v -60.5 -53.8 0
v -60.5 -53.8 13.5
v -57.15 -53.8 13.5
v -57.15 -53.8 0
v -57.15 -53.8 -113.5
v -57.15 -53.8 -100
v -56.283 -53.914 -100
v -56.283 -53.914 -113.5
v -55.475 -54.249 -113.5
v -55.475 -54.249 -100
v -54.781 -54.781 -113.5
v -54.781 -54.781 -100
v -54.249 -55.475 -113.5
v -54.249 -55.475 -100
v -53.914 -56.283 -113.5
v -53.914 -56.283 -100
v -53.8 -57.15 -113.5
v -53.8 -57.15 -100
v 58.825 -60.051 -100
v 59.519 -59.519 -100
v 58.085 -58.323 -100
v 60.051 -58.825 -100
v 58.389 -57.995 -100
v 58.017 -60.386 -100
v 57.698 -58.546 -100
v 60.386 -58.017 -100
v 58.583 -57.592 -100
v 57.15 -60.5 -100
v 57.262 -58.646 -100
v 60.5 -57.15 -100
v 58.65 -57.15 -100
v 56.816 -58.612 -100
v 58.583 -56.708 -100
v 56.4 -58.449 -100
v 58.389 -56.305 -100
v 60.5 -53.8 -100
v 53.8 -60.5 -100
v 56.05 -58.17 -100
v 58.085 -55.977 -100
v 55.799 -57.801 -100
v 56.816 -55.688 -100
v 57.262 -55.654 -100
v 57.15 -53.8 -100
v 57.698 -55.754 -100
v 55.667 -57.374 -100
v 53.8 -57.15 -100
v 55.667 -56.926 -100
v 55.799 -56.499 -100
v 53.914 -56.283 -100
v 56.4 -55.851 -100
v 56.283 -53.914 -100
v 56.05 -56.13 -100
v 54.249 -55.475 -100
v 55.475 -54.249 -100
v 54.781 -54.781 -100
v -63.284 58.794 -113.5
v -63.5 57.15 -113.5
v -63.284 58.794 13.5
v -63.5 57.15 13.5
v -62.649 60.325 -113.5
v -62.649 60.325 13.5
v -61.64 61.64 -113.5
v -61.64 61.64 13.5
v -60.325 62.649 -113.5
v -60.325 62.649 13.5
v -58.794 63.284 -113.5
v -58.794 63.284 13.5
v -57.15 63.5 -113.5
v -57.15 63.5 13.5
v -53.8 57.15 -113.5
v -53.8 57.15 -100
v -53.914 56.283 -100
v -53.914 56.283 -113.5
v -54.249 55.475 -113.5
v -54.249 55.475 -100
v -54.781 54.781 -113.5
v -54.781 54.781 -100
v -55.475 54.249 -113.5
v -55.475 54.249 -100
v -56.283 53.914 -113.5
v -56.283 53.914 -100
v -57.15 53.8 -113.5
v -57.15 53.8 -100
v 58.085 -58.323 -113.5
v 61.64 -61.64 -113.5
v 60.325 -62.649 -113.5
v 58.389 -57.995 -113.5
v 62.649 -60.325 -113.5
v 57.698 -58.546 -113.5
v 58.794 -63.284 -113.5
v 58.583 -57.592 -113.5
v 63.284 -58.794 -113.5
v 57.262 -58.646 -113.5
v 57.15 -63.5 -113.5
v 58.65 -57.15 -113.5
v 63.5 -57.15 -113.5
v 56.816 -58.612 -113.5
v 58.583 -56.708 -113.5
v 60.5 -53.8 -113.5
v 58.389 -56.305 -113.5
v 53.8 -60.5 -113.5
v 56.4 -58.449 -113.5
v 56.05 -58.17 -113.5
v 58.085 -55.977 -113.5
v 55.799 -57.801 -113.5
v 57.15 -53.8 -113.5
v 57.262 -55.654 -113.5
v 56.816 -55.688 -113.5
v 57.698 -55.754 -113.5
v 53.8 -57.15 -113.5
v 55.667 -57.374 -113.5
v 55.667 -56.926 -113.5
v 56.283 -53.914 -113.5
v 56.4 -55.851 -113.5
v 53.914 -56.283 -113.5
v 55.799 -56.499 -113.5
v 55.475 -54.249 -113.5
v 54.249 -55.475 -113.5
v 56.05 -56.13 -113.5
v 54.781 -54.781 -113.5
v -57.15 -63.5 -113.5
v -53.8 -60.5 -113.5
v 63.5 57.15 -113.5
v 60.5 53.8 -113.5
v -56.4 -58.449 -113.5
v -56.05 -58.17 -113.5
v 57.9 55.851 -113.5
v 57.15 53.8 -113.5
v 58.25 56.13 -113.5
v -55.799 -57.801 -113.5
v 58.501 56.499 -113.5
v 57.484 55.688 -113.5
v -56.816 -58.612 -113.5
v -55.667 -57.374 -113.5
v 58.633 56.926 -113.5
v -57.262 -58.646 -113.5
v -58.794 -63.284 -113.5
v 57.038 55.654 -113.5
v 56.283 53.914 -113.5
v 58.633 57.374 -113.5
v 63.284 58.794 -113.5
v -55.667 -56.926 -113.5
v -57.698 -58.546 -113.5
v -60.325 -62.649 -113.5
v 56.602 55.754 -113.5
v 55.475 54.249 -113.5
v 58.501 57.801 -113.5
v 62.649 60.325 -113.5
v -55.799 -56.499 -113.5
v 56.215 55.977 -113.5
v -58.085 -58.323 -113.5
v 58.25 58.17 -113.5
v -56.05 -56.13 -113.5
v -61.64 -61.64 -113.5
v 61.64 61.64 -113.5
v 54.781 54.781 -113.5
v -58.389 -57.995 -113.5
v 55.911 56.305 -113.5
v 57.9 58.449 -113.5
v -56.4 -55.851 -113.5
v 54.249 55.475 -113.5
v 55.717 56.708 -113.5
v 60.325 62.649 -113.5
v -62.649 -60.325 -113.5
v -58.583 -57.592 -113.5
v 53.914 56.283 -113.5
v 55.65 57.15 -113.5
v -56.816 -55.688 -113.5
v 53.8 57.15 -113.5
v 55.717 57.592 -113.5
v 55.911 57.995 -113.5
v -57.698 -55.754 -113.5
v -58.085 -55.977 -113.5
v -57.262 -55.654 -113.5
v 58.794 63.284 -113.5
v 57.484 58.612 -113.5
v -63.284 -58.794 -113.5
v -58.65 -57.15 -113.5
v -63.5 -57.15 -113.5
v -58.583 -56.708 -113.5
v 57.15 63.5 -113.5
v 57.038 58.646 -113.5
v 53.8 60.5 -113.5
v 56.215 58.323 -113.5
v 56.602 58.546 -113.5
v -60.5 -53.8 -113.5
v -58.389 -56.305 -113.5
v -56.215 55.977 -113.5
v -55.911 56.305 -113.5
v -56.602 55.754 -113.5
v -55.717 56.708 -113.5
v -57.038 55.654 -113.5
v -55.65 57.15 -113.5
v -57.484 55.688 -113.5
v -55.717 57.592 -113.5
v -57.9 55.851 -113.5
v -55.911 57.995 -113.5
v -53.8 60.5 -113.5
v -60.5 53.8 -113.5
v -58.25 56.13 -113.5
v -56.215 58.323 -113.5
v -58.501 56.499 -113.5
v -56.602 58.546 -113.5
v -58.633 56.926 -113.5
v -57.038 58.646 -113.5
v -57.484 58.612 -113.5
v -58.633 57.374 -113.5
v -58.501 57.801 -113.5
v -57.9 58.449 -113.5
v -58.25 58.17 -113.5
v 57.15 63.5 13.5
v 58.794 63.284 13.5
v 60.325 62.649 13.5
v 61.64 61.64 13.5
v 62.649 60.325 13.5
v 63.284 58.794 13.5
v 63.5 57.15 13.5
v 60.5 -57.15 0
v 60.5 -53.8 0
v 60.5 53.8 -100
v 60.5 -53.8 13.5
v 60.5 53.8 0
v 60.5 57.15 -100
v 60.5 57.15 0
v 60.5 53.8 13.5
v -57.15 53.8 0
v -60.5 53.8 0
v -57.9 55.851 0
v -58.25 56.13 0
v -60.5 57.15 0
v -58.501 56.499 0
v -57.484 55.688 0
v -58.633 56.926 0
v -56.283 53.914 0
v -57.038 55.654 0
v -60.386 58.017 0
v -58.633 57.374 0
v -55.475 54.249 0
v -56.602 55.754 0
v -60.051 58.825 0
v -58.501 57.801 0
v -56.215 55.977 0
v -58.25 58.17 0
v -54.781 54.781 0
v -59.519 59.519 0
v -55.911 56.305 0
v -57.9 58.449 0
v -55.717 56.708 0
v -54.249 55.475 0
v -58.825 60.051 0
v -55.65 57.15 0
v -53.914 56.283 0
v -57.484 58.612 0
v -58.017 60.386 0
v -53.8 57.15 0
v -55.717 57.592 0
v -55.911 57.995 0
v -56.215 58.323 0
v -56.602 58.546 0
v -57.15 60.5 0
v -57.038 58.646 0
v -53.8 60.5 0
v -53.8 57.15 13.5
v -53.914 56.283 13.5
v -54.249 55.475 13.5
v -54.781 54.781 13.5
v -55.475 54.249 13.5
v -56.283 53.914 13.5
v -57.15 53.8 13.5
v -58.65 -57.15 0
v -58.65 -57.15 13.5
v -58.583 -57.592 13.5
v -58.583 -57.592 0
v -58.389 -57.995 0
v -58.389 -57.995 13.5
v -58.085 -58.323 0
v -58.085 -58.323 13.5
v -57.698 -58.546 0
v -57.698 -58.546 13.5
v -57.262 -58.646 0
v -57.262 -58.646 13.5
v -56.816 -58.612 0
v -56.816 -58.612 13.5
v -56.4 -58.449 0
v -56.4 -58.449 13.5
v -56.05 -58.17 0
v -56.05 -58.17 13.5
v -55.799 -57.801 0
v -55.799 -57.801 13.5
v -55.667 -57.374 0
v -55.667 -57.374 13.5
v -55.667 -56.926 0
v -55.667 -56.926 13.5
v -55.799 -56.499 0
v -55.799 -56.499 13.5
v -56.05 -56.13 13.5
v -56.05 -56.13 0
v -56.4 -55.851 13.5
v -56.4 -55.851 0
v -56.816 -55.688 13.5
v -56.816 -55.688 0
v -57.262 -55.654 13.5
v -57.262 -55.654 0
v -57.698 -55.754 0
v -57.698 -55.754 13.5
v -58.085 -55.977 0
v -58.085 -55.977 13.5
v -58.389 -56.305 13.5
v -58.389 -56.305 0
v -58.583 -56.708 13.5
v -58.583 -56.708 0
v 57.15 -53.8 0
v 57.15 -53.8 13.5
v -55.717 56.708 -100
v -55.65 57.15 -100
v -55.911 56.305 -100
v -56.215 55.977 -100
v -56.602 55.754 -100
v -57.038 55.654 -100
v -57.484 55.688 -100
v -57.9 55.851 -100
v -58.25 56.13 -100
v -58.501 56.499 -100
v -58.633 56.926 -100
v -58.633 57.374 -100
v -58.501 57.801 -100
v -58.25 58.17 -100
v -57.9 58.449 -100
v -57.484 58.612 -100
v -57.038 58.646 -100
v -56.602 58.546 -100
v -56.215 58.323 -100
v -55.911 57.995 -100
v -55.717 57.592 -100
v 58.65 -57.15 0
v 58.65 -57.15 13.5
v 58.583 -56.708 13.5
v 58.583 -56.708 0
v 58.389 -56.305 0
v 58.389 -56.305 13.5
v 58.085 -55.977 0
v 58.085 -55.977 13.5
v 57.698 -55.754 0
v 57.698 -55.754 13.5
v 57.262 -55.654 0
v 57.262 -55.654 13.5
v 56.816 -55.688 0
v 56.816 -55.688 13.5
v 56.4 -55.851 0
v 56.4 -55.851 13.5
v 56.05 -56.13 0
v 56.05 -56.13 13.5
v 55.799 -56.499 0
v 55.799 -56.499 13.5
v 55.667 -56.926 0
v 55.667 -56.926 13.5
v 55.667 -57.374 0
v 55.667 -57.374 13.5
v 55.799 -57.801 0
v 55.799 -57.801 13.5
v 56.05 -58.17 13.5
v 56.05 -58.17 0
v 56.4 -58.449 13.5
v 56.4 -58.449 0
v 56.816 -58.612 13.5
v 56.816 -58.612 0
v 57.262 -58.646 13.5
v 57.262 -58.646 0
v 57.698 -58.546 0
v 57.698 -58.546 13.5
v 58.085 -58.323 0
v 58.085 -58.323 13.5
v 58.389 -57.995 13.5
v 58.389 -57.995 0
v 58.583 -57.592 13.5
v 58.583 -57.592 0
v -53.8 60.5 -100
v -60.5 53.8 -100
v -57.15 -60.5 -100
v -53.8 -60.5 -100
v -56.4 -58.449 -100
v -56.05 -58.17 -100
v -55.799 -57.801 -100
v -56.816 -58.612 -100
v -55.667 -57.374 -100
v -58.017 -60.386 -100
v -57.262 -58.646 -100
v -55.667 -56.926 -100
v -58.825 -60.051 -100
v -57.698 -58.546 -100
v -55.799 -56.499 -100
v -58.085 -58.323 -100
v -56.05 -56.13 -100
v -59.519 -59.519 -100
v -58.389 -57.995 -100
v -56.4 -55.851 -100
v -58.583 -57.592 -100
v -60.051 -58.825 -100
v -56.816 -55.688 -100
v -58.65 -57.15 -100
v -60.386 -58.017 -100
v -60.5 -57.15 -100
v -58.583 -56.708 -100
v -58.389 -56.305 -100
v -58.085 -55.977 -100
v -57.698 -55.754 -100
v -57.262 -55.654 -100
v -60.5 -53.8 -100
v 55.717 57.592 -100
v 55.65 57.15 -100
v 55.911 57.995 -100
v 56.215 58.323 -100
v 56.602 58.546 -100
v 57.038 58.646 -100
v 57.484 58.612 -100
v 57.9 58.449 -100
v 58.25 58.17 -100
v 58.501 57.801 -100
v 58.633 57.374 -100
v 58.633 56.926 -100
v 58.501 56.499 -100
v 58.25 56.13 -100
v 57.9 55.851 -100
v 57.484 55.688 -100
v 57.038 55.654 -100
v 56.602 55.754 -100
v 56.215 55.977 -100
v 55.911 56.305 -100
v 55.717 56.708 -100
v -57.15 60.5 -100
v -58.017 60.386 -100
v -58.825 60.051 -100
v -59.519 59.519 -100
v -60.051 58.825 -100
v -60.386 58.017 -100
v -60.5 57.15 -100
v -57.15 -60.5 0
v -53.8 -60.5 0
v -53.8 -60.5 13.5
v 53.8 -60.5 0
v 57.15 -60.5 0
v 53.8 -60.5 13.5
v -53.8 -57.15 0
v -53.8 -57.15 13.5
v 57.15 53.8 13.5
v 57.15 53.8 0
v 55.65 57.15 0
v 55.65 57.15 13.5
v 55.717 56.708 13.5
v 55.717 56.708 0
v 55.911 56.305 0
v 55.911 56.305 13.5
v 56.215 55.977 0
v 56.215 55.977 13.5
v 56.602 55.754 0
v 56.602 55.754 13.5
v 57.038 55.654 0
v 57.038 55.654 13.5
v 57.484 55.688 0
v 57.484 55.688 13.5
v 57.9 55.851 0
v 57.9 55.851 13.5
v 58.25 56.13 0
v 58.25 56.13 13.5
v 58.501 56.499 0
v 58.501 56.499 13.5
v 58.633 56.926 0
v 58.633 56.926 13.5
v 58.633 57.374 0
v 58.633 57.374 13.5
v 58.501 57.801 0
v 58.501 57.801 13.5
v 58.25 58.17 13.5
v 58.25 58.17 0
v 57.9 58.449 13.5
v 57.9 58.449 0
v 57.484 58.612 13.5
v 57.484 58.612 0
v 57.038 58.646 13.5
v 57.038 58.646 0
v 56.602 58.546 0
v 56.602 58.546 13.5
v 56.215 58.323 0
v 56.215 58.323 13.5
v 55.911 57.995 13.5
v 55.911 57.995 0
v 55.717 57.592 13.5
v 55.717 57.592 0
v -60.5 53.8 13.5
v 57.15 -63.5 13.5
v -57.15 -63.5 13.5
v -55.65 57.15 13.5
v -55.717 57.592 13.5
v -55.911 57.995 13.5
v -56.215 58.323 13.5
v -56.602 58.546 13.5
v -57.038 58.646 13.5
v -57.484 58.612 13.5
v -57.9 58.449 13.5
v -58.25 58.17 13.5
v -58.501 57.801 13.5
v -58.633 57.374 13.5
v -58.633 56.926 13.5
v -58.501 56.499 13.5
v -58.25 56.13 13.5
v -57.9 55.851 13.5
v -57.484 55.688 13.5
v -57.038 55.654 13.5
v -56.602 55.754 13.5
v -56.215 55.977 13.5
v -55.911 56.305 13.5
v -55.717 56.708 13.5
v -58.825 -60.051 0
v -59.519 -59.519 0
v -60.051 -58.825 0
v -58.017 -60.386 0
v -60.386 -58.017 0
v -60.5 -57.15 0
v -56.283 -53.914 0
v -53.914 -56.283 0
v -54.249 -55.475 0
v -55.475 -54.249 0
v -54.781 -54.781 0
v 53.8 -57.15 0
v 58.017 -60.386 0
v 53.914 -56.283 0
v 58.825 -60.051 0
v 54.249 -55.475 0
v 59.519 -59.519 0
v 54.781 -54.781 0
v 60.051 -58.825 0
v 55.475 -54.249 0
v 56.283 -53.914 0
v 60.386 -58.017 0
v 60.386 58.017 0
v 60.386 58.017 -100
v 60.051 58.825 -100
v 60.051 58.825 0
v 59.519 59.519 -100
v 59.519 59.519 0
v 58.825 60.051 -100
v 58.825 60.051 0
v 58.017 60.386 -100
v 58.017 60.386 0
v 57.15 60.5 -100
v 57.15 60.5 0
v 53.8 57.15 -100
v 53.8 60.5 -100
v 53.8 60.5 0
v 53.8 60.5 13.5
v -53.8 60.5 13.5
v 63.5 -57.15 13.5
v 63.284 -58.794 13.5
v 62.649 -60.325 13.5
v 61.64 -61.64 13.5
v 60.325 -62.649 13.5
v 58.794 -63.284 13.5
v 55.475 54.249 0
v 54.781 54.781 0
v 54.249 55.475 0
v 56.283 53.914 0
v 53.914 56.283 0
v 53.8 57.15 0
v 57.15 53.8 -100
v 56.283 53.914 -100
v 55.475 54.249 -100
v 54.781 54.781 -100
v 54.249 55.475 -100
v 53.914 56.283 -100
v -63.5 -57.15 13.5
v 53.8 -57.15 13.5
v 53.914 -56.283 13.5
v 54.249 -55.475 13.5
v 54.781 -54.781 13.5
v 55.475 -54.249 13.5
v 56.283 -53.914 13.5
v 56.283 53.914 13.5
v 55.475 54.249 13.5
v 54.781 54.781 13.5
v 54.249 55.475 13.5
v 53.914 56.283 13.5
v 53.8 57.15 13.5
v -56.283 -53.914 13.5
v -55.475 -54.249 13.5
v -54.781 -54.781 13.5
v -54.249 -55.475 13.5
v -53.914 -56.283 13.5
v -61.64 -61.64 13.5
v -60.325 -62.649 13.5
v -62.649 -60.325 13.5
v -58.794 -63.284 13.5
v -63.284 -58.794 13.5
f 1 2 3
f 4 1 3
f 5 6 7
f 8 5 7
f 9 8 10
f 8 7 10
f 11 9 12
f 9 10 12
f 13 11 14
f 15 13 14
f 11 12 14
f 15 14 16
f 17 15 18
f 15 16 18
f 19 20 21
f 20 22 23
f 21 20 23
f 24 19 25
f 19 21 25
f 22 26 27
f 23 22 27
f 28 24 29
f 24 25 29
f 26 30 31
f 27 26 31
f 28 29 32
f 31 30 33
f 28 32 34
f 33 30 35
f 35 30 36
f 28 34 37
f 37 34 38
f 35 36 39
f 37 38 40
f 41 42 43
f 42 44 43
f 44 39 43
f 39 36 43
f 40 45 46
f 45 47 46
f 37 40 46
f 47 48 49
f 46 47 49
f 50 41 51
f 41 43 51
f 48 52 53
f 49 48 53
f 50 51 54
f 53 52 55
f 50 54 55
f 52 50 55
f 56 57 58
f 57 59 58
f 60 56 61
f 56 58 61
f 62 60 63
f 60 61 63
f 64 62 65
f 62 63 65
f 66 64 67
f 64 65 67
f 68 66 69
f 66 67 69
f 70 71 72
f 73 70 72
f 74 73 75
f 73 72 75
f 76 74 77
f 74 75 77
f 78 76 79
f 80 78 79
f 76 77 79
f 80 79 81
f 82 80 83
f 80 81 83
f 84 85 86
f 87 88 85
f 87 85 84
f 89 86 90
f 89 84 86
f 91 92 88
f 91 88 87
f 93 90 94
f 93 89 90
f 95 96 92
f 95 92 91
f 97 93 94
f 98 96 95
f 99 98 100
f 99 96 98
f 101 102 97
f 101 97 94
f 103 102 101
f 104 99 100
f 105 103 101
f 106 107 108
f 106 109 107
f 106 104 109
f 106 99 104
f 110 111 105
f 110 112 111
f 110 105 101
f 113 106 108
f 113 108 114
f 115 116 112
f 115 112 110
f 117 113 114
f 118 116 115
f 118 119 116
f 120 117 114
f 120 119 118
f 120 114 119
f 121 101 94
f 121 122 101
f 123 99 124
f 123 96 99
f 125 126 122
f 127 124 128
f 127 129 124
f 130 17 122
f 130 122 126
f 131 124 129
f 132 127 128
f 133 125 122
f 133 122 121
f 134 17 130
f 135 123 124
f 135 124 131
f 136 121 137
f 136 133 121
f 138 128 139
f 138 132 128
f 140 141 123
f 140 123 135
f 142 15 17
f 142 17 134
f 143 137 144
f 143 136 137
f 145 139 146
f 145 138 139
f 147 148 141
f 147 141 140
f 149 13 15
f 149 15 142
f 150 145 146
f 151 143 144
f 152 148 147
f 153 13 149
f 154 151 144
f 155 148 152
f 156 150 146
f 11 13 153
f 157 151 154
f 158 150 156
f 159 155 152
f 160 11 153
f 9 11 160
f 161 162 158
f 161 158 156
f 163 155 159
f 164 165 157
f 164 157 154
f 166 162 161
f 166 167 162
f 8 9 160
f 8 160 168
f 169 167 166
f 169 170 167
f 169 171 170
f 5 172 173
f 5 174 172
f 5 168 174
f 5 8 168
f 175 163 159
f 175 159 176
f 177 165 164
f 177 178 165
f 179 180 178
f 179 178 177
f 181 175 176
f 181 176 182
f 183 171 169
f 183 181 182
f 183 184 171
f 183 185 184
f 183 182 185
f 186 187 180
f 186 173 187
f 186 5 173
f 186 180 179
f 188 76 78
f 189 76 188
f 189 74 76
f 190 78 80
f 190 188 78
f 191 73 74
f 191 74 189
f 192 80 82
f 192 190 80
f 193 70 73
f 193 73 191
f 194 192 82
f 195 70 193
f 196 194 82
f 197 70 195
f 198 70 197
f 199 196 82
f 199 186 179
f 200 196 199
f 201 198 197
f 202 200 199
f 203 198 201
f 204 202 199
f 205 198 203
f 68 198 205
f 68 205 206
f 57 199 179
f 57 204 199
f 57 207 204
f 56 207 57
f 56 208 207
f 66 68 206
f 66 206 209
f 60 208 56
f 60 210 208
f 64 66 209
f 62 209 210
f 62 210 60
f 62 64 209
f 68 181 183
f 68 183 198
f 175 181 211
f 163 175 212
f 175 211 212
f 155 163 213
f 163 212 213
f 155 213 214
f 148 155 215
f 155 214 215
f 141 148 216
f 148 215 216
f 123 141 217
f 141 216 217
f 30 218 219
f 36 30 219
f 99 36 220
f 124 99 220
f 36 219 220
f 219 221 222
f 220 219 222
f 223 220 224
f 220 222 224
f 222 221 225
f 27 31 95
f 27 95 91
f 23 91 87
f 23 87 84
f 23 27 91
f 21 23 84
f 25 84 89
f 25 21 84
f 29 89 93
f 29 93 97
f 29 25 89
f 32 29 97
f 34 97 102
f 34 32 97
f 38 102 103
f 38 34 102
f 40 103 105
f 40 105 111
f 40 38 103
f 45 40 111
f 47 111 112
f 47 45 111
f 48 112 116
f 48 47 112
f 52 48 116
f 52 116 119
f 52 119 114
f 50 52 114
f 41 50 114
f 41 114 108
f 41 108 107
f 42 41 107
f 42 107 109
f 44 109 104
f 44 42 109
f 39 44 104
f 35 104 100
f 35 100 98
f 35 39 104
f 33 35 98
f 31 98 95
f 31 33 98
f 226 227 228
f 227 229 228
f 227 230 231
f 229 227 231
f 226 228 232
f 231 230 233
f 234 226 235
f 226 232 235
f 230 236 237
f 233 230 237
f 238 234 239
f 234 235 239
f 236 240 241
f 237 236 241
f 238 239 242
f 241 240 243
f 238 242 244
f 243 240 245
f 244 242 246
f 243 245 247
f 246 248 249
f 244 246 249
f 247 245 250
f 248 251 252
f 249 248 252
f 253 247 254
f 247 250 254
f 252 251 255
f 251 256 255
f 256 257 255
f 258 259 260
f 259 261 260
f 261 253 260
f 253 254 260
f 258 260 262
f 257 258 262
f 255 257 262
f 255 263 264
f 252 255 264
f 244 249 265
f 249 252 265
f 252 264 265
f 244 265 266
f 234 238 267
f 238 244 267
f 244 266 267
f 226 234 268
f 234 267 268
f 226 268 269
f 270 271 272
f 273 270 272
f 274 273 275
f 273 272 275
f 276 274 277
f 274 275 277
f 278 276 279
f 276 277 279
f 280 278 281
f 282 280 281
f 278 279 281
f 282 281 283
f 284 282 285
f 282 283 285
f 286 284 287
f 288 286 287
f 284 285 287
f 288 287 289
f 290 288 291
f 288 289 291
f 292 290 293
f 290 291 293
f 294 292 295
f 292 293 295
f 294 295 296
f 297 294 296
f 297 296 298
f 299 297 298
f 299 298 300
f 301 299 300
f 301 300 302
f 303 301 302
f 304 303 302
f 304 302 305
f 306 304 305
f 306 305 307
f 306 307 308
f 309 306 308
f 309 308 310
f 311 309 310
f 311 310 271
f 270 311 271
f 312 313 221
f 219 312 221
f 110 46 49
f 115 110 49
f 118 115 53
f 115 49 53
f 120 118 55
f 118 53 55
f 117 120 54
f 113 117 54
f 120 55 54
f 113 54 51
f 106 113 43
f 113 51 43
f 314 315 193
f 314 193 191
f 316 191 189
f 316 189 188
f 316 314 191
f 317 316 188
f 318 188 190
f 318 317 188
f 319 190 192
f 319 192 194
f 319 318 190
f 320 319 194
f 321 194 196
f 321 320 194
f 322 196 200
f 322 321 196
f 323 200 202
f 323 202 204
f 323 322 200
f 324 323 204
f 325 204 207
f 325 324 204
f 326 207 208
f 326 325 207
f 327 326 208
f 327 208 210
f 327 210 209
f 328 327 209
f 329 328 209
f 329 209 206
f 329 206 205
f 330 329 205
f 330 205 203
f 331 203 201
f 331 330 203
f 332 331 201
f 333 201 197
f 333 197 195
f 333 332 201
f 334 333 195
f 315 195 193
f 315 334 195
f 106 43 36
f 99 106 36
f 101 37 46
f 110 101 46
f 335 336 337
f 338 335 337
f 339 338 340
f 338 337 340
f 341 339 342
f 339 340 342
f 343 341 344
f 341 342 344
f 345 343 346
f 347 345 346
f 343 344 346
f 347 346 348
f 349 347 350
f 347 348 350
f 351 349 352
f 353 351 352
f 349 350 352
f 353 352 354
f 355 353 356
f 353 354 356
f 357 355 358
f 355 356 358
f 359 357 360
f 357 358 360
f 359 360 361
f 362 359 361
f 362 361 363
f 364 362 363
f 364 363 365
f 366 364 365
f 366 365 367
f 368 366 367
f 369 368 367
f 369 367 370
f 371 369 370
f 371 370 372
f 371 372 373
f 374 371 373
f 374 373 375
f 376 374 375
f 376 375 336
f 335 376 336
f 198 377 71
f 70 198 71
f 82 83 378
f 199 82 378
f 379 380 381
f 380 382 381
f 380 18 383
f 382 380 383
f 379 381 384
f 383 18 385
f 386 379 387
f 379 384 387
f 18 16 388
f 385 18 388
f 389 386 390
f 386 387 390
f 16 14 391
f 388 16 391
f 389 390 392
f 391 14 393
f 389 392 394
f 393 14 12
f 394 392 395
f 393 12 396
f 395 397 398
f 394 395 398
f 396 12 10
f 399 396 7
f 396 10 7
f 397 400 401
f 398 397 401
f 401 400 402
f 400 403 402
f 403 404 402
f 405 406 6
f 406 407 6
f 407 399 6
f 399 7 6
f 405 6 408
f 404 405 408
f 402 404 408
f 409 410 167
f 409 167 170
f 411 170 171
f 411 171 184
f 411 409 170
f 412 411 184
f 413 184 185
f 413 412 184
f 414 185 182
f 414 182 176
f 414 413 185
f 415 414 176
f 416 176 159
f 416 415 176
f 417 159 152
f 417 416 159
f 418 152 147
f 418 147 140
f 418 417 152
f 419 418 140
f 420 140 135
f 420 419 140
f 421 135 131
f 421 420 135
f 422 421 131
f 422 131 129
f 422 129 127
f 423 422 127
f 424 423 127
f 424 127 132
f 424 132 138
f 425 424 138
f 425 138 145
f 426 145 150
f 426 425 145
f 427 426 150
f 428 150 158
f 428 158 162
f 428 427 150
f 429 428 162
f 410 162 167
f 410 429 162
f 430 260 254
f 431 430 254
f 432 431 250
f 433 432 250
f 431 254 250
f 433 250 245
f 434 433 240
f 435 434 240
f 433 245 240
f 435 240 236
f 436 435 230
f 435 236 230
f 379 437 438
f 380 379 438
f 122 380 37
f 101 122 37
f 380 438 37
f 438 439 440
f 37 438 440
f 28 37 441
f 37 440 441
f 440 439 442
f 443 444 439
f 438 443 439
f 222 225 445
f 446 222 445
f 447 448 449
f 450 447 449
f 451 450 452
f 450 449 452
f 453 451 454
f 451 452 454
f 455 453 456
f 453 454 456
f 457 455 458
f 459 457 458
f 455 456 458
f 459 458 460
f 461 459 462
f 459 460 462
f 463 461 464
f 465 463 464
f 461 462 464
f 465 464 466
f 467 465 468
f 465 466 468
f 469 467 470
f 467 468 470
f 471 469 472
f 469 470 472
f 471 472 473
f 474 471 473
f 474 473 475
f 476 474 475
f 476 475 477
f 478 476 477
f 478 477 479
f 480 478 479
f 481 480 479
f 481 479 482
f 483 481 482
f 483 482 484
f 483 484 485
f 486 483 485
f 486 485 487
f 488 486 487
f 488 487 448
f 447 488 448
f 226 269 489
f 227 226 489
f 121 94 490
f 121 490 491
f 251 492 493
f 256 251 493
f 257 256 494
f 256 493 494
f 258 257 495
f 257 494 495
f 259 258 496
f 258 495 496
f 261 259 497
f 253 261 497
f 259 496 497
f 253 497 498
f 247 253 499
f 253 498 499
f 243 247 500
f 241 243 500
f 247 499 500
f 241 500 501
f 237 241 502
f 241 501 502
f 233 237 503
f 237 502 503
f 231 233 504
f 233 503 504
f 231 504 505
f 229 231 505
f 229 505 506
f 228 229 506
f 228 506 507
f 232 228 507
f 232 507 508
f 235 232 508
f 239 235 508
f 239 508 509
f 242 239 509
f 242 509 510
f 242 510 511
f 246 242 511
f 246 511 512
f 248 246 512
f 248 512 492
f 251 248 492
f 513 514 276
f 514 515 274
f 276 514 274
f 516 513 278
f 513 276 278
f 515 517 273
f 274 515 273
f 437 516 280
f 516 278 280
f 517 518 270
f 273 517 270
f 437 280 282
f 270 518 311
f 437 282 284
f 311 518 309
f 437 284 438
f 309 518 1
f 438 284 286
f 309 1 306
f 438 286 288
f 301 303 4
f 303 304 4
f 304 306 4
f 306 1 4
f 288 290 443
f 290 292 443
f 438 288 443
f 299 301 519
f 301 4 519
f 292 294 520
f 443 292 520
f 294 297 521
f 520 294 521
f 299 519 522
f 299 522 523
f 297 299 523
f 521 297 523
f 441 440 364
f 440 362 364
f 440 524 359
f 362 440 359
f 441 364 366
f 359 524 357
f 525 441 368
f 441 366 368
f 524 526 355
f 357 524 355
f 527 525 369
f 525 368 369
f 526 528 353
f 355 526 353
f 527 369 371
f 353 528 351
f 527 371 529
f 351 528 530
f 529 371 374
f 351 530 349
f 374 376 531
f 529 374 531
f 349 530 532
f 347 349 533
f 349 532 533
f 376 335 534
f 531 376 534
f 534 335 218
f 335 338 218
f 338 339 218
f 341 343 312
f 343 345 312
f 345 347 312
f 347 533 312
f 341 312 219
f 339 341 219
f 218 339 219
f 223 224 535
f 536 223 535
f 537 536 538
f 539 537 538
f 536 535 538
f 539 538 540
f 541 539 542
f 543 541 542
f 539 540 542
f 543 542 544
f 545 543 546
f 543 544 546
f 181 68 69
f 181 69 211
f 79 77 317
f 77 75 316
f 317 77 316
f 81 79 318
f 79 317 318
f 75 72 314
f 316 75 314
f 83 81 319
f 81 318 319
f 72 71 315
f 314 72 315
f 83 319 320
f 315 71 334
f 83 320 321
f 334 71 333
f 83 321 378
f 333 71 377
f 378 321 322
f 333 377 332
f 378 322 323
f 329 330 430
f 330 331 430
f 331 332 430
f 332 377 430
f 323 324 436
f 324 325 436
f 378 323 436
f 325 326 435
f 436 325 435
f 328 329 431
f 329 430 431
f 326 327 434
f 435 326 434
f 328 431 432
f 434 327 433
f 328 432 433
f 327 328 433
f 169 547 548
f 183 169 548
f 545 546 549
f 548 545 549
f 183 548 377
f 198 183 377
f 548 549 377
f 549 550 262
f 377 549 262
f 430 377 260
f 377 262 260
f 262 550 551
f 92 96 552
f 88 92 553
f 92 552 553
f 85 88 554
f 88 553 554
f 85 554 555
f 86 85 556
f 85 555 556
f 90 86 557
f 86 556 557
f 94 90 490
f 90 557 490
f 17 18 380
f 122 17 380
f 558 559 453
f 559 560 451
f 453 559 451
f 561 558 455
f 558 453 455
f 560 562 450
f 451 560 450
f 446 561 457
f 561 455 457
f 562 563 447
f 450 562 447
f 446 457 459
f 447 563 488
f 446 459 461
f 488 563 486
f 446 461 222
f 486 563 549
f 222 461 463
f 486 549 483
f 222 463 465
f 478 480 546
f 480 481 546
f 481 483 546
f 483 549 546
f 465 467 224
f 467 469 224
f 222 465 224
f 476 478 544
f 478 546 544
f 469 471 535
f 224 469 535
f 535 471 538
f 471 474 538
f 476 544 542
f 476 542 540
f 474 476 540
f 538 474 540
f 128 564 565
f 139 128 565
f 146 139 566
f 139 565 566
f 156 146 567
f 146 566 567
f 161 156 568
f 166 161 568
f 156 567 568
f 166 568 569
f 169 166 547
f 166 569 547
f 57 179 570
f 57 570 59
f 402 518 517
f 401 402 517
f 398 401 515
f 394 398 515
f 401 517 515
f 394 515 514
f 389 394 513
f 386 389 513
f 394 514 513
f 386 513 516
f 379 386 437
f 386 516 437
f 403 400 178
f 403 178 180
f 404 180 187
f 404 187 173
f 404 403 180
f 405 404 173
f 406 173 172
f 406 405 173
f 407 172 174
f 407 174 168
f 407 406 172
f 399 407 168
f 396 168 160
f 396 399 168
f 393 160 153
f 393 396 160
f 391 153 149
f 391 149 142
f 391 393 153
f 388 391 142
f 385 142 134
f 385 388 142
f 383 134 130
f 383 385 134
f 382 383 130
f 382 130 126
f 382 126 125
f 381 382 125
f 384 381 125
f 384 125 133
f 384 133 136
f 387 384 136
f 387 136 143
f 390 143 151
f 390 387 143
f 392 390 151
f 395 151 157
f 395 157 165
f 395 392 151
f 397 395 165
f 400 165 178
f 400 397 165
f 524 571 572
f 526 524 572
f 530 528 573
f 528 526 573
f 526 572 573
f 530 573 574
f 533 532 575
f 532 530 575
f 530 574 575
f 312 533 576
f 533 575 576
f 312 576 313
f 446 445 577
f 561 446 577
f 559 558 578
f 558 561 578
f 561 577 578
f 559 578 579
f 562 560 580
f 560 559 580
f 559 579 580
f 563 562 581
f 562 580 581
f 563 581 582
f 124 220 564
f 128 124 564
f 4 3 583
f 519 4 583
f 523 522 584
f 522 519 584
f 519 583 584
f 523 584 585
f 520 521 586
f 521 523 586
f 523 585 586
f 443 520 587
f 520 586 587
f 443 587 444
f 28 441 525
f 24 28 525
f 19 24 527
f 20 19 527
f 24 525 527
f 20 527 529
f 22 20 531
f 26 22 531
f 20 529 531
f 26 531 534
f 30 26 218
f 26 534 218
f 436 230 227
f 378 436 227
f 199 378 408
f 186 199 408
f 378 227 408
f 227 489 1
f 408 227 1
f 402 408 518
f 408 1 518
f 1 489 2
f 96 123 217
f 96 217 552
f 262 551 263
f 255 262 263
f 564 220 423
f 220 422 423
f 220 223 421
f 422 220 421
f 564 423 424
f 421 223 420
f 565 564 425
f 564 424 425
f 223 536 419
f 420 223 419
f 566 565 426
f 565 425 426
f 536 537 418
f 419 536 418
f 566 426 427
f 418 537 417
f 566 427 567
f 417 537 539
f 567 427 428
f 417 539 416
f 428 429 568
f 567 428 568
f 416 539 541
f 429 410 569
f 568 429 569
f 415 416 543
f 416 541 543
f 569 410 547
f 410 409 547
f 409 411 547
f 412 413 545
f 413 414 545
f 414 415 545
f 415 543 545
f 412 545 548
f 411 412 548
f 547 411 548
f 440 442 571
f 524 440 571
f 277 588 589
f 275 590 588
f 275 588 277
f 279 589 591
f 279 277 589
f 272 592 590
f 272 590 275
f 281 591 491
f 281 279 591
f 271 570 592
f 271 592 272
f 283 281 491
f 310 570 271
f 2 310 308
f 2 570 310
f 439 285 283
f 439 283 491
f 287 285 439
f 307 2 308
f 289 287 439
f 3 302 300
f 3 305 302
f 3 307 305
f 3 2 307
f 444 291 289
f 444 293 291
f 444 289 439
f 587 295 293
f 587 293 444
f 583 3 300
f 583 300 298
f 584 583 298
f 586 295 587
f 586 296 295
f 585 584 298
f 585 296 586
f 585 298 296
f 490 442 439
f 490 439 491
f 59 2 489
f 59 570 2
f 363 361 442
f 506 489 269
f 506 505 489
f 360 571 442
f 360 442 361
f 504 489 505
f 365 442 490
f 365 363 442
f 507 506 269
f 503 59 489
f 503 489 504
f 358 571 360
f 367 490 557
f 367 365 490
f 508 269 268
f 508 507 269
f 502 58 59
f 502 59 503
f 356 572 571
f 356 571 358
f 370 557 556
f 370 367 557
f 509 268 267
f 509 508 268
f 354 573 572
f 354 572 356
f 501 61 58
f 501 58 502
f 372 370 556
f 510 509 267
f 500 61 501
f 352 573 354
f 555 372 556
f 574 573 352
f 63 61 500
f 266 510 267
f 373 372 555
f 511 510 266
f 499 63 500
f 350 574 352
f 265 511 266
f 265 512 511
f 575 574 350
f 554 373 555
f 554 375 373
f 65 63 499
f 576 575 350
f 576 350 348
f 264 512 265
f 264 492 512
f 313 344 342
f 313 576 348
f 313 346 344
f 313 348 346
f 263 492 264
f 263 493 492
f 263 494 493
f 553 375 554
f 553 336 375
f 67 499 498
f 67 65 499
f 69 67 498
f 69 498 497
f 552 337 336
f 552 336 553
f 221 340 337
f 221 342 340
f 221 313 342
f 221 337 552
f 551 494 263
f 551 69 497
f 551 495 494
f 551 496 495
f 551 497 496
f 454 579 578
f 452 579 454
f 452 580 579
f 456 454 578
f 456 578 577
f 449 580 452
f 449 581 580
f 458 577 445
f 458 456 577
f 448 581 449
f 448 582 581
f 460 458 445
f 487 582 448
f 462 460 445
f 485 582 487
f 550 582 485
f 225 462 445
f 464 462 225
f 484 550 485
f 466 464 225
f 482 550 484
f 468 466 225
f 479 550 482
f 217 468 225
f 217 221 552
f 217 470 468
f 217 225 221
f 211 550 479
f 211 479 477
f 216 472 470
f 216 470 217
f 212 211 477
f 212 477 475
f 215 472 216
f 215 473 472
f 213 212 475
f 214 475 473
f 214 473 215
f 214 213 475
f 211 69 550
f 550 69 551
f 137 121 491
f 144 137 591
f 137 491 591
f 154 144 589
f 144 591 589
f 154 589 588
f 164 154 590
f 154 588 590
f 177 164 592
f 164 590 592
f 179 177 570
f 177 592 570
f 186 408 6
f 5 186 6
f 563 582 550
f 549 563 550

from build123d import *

# Parameters (mm, degrees)
SKETCH1_W           = 127
SKETCH1_H           = 127
SKETCH1_W_2         = 121
SKETCH1_H_2         = 121
SKETCH1_R           = 38.5
BOSS_EXTRUDE1_DEPTH = 13.5
FILLET1_R           = 6.35
SKETCH2_R           = 1.5
CUT_EXTRUDE1_DEPTH  = 91.811618199
BOSS_EXTRUDE2_DEPTH = 100
SKETCH5_R           = 1.5
BOSS_EXTRUDE3_DEPTH = 13.5


with BuildPart() as part:
    # Sketch1 → Boss-Extrude1 (new body)
    with BuildSketch(Plane.XY):
        Rectangle(SKETCH1_W, SKETCH1_H)
        Rectangle(SKETCH1_W_2, SKETCH1_H_2, mode=Mode.SUBTRACT)
        Rectangle(SKETCH1_W_2, SKETCH1_H_2)
        Circle(SKETCH1_R, mode=Mode.SUBTRACT)
        Circle(SKETCH1_R)
    extrude(amount=BOSS_EXTRUDE1_DEPTH)

    # Fillet1
    fillet1_edges = [part.edges().sort_by_distance(p)[0] for p in [
        (-63.5, 63.5, 6.75),
        (63.5, 63.5, 6.75),
        (63.5, -63.5, 6.75),
        (-63.5, -63.5, 6.75),
    ]]
    fillet(fillet1_edges, radius=FILLET1_R)

    # Sketch2 → Cut-Extrude1 (cut, through all)
    with BuildSketch(Plane.XY.offset(13.5)):
        with Locations(Location((57.15, 57.15, 0), (0, 0, 180))):
            Circle(SKETCH2_R)
        with Locations((57.15, -57.15)):
            Circle(SKETCH2_R)
        with Locations((-57.15, 57.15)):
            Circle(SKETCH2_R)
        with Locations(Location((-57.15, -57.15, 0), (0, 0, 180))):
            Circle(SKETCH2_R)
        with BuildLine():
            Line((53.8, 57.15), (53.8, 60.5))
            Line((53.8, 60.5), (-53.8, 60.5))
            Line((-53.8, 60.5), (-53.8, 57.15))
            ThreePointArc((-53.8, 57.15), (-54.781192283, 54.781192283), (-57.15, 53.8))
            Line((-57.15, 53.8), (-60.5, 53.8))
            Line((-60.5, 53.8), (-60.5, -53.8))
            Line((-60.5, -53.8), (-57.15, -53.8))
            ThreePointArc((-57.15, -53.8), (-54.781192283, -54.781192283), (-53.8, -57.15))
            Line((-53.8, -57.15), (-53.8, -60.5))
            Line((-53.8, -60.5), (53.8, -60.5))
            Line((53.8, -60.5), (53.8, -57.15))
            ThreePointArc((53.8, -57.15), (54.781192283, -54.781192283), (57.15, -53.8))
            Line((57.15, -53.8), (60.5, -53.8))
            Line((60.5, -53.8), (60.5, 53.8))
            Line((60.5, 53.8), (57.15, 53.8))
            ThreePointArc((57.15, 53.8), (54.781192283, 54.781192283), (53.8, 57.15))
        make_face()
    extrude(amount=-CUT_EXTRUDE1_DEPTH, mode=Mode.SUBTRACT)

    # Sketch4 → Boss-Extrude2 (add)
    with BuildSketch(Plane(origin=(0, 0, 0), x_dir=(-1, 0, 0), z_dir=(0, 0, -1))):
        with BuildLine():
            ThreePointArc((63.5, 57.15), (61.640128061, 61.640128061), (57.15, 63.5))
            Line((57.15, 63.5), (-57.15, 63.5))
            ThreePointArc((-57.15, 63.5), (-61.640128061, 61.640128061), (-63.5, 57.15))
            Line((-63.5, 57.15), (-63.5, -57.15))
            ThreePointArc((-63.5, -57.15), (-61.640128061, -61.640128061), (-57.15, -63.5))
            Line((-57.15, -63.5), (57.15, -63.5))
            ThreePointArc((57.15, -63.5), (61.640128061, -61.640128061), (63.5, -57.15))
            Line((63.5, -57.15), (63.5, 57.15))
        make_face()
        with BuildLine():
            Line((53.8, 60.5), (57.15, 60.5))
            ThreePointArc((57.15, 60.5), (59.518807717, 59.518807717), (60.5, 57.15))
            Line((60.5, 57.15), (60.5, 53.8))
            Line((60.5, 53.8), (60.5, -53.8))
            Line((60.5, -53.8), (60.5, -57.15))
            ThreePointArc((60.5, -57.15), (59.518807717, -59.518807717), (57.15, -60.5))
            Line((57.15, -60.5), (53.8, -60.5))
            Line((53.8, -60.5), (-53.8, -60.5))
            Line((-53.8, -60.5), (-57.15, -60.5))
            ThreePointArc((-57.15, -60.5), (-59.518807717, -59.518807717), (-60.5, -57.15))
            Line((-60.5, -57.15), (-60.5, -53.8))
            Line((-60.5, -53.8), (-60.5, 53.8))
            Line((-60.5, 53.8), (-60.5, 57.15))
            ThreePointArc((-60.5, 57.15), (-59.518807717, 59.518807717), (-57.15, 60.5))
            Line((-57.15, 60.5), (-53.8, 60.5))
            Line((-53.8, 60.5), (53.8, 60.5))
        make_face(mode=Mode.SUBTRACT)
    extrude(amount=BOSS_EXTRUDE2_DEPTH)

    # Sketch5 → Boss-Extrude3 (add)
    with BuildSketch(Plane(origin=(0, 0, -100), x_dir=(-1, 0, 0), z_dir=(0, 0, -1))):
        with BuildLine():
            Line((63.5, -57.15), (63.5, 57.15))
            ThreePointArc((63.5, 57.15), (61.640128061, 61.640128061), (57.15, 63.5))
            Line((57.15, 63.5), (-57.15, 63.5))
            ThreePointArc((-57.15, 63.5), (-61.640128061, 61.640128061), (-63.5, 57.15))
            Line((-63.5, 57.15), (-63.5, -57.15))
            ThreePointArc((-63.5, -57.15), (-61.640128061, -61.640128061), (-57.15, -63.5))
            Line((-57.15, -63.5), (57.15, -63.5))
            ThreePointArc((57.15, -63.5), (61.640128061, -61.640128061), (63.5, -57.15))
        make_face()
        with BuildLine():
            Line((-60.5, -57.15), (-60.5, 57.15))
            ThreePointArc((-60.5, 57.15), (-59.518807717, 59.518807717), (-57.15, 60.5))
            Line((-57.15, 60.5), (57.15, 60.5))
            ThreePointArc((57.15, 60.5), (59.518807717, 59.518807717), (60.5, 57.15))
            Line((60.5, 57.15), (60.5, -57.15))
            ThreePointArc((60.5, -57.15), (59.518807717, -59.518807717), (57.15, -60.5))
            Line((57.15, -60.5), (-57.15, -60.5))
            ThreePointArc((-57.15, -60.5), (-59.518807717, -59.518807717), (-60.5, -57.15))
        make_face(mode=Mode.SUBTRACT)
        with BuildLine():
            Line((-57.15, -53.8), (-60.5, -53.8))
            Line((-60.5, -53.8), (-60.5, -57.15))
            ThreePointArc((-60.5, -57.15), (-59.518807717, -59.518807717), (-57.15, -60.5))
            Line((-57.15, -60.5), (-53.8, -60.5))
            Line((-53.8, -60.5), (-53.8, -57.15))
            ThreePointArc((-53.8, -57.15), (-54.781192283, -54.781192283), (-57.15, -53.8))
        make_face()
        with Locations(Location((-57.15, -57.15, 0), (0, 0, 180))):
            Circle(SKETCH5_R, mode=Mode.SUBTRACT)
        with BuildLine():
            Line((60.5, -57.15), (60.5, -53.8))
            Line((60.5, -53.8), (57.15, -53.8))
            ThreePointArc((57.15, -53.8), (54.781192283, -54.781192283), (53.8, -57.15))
            Line((53.8, -57.15), (53.8, -60.5))
            Line((53.8, -60.5), (57.15, -60.5))
            ThreePointArc((57.15, -60.5), (59.518807717, -59.518807717), (60.5, -57.15))
        make_face()
        with Locations((57.15, -57.15)):
            Circle(SKETCH5_R, mode=Mode.SUBTRACT)
        with BuildLine():
            Line((57.15, 60.5), (53.8, 60.5))
            Line((53.8, 60.5), (53.8, 57.15))
            ThreePointArc((53.8, 57.15), (54.781192283, 54.781192283), (57.15, 53.8))
            Line((57.15, 53.8), (60.5, 53.8))
            Line((60.5, 53.8), (60.5, 57.15))
            ThreePointArc((60.5, 57.15), (59.518807717, 59.518807717), (57.15, 60.5))
        make_face()
        with Locations(Location((57.15, 57.15, 0), (0, 0, 180))):
            Circle(SKETCH5_R, mode=Mode.SUBTRACT)
        with BuildLine():
            Line((-53.8, 57.15), (-53.8, 60.5))
            Line((-53.8, 60.5), (-57.15, 60.5))
            ThreePointArc((-57.15, 60.5), (-59.518807717, 59.518807717), (-60.5, 57.15))
            Line((-60.5, 57.15), (-60.5, 53.8))
            Line((-60.5, 53.8), (-57.15, 53.8))
            ThreePointArc((-57.15, 53.8), (-54.781192283, 54.781192283), (-53.8, 57.15))
        make_face()
        with Locations((-57.15, 57.15)):
            Circle(SKETCH5_R, mode=Mode.SUBTRACT)
    extrude(amount=BOSS_EXTRUDE3_DEPTH)


solid = part.part
